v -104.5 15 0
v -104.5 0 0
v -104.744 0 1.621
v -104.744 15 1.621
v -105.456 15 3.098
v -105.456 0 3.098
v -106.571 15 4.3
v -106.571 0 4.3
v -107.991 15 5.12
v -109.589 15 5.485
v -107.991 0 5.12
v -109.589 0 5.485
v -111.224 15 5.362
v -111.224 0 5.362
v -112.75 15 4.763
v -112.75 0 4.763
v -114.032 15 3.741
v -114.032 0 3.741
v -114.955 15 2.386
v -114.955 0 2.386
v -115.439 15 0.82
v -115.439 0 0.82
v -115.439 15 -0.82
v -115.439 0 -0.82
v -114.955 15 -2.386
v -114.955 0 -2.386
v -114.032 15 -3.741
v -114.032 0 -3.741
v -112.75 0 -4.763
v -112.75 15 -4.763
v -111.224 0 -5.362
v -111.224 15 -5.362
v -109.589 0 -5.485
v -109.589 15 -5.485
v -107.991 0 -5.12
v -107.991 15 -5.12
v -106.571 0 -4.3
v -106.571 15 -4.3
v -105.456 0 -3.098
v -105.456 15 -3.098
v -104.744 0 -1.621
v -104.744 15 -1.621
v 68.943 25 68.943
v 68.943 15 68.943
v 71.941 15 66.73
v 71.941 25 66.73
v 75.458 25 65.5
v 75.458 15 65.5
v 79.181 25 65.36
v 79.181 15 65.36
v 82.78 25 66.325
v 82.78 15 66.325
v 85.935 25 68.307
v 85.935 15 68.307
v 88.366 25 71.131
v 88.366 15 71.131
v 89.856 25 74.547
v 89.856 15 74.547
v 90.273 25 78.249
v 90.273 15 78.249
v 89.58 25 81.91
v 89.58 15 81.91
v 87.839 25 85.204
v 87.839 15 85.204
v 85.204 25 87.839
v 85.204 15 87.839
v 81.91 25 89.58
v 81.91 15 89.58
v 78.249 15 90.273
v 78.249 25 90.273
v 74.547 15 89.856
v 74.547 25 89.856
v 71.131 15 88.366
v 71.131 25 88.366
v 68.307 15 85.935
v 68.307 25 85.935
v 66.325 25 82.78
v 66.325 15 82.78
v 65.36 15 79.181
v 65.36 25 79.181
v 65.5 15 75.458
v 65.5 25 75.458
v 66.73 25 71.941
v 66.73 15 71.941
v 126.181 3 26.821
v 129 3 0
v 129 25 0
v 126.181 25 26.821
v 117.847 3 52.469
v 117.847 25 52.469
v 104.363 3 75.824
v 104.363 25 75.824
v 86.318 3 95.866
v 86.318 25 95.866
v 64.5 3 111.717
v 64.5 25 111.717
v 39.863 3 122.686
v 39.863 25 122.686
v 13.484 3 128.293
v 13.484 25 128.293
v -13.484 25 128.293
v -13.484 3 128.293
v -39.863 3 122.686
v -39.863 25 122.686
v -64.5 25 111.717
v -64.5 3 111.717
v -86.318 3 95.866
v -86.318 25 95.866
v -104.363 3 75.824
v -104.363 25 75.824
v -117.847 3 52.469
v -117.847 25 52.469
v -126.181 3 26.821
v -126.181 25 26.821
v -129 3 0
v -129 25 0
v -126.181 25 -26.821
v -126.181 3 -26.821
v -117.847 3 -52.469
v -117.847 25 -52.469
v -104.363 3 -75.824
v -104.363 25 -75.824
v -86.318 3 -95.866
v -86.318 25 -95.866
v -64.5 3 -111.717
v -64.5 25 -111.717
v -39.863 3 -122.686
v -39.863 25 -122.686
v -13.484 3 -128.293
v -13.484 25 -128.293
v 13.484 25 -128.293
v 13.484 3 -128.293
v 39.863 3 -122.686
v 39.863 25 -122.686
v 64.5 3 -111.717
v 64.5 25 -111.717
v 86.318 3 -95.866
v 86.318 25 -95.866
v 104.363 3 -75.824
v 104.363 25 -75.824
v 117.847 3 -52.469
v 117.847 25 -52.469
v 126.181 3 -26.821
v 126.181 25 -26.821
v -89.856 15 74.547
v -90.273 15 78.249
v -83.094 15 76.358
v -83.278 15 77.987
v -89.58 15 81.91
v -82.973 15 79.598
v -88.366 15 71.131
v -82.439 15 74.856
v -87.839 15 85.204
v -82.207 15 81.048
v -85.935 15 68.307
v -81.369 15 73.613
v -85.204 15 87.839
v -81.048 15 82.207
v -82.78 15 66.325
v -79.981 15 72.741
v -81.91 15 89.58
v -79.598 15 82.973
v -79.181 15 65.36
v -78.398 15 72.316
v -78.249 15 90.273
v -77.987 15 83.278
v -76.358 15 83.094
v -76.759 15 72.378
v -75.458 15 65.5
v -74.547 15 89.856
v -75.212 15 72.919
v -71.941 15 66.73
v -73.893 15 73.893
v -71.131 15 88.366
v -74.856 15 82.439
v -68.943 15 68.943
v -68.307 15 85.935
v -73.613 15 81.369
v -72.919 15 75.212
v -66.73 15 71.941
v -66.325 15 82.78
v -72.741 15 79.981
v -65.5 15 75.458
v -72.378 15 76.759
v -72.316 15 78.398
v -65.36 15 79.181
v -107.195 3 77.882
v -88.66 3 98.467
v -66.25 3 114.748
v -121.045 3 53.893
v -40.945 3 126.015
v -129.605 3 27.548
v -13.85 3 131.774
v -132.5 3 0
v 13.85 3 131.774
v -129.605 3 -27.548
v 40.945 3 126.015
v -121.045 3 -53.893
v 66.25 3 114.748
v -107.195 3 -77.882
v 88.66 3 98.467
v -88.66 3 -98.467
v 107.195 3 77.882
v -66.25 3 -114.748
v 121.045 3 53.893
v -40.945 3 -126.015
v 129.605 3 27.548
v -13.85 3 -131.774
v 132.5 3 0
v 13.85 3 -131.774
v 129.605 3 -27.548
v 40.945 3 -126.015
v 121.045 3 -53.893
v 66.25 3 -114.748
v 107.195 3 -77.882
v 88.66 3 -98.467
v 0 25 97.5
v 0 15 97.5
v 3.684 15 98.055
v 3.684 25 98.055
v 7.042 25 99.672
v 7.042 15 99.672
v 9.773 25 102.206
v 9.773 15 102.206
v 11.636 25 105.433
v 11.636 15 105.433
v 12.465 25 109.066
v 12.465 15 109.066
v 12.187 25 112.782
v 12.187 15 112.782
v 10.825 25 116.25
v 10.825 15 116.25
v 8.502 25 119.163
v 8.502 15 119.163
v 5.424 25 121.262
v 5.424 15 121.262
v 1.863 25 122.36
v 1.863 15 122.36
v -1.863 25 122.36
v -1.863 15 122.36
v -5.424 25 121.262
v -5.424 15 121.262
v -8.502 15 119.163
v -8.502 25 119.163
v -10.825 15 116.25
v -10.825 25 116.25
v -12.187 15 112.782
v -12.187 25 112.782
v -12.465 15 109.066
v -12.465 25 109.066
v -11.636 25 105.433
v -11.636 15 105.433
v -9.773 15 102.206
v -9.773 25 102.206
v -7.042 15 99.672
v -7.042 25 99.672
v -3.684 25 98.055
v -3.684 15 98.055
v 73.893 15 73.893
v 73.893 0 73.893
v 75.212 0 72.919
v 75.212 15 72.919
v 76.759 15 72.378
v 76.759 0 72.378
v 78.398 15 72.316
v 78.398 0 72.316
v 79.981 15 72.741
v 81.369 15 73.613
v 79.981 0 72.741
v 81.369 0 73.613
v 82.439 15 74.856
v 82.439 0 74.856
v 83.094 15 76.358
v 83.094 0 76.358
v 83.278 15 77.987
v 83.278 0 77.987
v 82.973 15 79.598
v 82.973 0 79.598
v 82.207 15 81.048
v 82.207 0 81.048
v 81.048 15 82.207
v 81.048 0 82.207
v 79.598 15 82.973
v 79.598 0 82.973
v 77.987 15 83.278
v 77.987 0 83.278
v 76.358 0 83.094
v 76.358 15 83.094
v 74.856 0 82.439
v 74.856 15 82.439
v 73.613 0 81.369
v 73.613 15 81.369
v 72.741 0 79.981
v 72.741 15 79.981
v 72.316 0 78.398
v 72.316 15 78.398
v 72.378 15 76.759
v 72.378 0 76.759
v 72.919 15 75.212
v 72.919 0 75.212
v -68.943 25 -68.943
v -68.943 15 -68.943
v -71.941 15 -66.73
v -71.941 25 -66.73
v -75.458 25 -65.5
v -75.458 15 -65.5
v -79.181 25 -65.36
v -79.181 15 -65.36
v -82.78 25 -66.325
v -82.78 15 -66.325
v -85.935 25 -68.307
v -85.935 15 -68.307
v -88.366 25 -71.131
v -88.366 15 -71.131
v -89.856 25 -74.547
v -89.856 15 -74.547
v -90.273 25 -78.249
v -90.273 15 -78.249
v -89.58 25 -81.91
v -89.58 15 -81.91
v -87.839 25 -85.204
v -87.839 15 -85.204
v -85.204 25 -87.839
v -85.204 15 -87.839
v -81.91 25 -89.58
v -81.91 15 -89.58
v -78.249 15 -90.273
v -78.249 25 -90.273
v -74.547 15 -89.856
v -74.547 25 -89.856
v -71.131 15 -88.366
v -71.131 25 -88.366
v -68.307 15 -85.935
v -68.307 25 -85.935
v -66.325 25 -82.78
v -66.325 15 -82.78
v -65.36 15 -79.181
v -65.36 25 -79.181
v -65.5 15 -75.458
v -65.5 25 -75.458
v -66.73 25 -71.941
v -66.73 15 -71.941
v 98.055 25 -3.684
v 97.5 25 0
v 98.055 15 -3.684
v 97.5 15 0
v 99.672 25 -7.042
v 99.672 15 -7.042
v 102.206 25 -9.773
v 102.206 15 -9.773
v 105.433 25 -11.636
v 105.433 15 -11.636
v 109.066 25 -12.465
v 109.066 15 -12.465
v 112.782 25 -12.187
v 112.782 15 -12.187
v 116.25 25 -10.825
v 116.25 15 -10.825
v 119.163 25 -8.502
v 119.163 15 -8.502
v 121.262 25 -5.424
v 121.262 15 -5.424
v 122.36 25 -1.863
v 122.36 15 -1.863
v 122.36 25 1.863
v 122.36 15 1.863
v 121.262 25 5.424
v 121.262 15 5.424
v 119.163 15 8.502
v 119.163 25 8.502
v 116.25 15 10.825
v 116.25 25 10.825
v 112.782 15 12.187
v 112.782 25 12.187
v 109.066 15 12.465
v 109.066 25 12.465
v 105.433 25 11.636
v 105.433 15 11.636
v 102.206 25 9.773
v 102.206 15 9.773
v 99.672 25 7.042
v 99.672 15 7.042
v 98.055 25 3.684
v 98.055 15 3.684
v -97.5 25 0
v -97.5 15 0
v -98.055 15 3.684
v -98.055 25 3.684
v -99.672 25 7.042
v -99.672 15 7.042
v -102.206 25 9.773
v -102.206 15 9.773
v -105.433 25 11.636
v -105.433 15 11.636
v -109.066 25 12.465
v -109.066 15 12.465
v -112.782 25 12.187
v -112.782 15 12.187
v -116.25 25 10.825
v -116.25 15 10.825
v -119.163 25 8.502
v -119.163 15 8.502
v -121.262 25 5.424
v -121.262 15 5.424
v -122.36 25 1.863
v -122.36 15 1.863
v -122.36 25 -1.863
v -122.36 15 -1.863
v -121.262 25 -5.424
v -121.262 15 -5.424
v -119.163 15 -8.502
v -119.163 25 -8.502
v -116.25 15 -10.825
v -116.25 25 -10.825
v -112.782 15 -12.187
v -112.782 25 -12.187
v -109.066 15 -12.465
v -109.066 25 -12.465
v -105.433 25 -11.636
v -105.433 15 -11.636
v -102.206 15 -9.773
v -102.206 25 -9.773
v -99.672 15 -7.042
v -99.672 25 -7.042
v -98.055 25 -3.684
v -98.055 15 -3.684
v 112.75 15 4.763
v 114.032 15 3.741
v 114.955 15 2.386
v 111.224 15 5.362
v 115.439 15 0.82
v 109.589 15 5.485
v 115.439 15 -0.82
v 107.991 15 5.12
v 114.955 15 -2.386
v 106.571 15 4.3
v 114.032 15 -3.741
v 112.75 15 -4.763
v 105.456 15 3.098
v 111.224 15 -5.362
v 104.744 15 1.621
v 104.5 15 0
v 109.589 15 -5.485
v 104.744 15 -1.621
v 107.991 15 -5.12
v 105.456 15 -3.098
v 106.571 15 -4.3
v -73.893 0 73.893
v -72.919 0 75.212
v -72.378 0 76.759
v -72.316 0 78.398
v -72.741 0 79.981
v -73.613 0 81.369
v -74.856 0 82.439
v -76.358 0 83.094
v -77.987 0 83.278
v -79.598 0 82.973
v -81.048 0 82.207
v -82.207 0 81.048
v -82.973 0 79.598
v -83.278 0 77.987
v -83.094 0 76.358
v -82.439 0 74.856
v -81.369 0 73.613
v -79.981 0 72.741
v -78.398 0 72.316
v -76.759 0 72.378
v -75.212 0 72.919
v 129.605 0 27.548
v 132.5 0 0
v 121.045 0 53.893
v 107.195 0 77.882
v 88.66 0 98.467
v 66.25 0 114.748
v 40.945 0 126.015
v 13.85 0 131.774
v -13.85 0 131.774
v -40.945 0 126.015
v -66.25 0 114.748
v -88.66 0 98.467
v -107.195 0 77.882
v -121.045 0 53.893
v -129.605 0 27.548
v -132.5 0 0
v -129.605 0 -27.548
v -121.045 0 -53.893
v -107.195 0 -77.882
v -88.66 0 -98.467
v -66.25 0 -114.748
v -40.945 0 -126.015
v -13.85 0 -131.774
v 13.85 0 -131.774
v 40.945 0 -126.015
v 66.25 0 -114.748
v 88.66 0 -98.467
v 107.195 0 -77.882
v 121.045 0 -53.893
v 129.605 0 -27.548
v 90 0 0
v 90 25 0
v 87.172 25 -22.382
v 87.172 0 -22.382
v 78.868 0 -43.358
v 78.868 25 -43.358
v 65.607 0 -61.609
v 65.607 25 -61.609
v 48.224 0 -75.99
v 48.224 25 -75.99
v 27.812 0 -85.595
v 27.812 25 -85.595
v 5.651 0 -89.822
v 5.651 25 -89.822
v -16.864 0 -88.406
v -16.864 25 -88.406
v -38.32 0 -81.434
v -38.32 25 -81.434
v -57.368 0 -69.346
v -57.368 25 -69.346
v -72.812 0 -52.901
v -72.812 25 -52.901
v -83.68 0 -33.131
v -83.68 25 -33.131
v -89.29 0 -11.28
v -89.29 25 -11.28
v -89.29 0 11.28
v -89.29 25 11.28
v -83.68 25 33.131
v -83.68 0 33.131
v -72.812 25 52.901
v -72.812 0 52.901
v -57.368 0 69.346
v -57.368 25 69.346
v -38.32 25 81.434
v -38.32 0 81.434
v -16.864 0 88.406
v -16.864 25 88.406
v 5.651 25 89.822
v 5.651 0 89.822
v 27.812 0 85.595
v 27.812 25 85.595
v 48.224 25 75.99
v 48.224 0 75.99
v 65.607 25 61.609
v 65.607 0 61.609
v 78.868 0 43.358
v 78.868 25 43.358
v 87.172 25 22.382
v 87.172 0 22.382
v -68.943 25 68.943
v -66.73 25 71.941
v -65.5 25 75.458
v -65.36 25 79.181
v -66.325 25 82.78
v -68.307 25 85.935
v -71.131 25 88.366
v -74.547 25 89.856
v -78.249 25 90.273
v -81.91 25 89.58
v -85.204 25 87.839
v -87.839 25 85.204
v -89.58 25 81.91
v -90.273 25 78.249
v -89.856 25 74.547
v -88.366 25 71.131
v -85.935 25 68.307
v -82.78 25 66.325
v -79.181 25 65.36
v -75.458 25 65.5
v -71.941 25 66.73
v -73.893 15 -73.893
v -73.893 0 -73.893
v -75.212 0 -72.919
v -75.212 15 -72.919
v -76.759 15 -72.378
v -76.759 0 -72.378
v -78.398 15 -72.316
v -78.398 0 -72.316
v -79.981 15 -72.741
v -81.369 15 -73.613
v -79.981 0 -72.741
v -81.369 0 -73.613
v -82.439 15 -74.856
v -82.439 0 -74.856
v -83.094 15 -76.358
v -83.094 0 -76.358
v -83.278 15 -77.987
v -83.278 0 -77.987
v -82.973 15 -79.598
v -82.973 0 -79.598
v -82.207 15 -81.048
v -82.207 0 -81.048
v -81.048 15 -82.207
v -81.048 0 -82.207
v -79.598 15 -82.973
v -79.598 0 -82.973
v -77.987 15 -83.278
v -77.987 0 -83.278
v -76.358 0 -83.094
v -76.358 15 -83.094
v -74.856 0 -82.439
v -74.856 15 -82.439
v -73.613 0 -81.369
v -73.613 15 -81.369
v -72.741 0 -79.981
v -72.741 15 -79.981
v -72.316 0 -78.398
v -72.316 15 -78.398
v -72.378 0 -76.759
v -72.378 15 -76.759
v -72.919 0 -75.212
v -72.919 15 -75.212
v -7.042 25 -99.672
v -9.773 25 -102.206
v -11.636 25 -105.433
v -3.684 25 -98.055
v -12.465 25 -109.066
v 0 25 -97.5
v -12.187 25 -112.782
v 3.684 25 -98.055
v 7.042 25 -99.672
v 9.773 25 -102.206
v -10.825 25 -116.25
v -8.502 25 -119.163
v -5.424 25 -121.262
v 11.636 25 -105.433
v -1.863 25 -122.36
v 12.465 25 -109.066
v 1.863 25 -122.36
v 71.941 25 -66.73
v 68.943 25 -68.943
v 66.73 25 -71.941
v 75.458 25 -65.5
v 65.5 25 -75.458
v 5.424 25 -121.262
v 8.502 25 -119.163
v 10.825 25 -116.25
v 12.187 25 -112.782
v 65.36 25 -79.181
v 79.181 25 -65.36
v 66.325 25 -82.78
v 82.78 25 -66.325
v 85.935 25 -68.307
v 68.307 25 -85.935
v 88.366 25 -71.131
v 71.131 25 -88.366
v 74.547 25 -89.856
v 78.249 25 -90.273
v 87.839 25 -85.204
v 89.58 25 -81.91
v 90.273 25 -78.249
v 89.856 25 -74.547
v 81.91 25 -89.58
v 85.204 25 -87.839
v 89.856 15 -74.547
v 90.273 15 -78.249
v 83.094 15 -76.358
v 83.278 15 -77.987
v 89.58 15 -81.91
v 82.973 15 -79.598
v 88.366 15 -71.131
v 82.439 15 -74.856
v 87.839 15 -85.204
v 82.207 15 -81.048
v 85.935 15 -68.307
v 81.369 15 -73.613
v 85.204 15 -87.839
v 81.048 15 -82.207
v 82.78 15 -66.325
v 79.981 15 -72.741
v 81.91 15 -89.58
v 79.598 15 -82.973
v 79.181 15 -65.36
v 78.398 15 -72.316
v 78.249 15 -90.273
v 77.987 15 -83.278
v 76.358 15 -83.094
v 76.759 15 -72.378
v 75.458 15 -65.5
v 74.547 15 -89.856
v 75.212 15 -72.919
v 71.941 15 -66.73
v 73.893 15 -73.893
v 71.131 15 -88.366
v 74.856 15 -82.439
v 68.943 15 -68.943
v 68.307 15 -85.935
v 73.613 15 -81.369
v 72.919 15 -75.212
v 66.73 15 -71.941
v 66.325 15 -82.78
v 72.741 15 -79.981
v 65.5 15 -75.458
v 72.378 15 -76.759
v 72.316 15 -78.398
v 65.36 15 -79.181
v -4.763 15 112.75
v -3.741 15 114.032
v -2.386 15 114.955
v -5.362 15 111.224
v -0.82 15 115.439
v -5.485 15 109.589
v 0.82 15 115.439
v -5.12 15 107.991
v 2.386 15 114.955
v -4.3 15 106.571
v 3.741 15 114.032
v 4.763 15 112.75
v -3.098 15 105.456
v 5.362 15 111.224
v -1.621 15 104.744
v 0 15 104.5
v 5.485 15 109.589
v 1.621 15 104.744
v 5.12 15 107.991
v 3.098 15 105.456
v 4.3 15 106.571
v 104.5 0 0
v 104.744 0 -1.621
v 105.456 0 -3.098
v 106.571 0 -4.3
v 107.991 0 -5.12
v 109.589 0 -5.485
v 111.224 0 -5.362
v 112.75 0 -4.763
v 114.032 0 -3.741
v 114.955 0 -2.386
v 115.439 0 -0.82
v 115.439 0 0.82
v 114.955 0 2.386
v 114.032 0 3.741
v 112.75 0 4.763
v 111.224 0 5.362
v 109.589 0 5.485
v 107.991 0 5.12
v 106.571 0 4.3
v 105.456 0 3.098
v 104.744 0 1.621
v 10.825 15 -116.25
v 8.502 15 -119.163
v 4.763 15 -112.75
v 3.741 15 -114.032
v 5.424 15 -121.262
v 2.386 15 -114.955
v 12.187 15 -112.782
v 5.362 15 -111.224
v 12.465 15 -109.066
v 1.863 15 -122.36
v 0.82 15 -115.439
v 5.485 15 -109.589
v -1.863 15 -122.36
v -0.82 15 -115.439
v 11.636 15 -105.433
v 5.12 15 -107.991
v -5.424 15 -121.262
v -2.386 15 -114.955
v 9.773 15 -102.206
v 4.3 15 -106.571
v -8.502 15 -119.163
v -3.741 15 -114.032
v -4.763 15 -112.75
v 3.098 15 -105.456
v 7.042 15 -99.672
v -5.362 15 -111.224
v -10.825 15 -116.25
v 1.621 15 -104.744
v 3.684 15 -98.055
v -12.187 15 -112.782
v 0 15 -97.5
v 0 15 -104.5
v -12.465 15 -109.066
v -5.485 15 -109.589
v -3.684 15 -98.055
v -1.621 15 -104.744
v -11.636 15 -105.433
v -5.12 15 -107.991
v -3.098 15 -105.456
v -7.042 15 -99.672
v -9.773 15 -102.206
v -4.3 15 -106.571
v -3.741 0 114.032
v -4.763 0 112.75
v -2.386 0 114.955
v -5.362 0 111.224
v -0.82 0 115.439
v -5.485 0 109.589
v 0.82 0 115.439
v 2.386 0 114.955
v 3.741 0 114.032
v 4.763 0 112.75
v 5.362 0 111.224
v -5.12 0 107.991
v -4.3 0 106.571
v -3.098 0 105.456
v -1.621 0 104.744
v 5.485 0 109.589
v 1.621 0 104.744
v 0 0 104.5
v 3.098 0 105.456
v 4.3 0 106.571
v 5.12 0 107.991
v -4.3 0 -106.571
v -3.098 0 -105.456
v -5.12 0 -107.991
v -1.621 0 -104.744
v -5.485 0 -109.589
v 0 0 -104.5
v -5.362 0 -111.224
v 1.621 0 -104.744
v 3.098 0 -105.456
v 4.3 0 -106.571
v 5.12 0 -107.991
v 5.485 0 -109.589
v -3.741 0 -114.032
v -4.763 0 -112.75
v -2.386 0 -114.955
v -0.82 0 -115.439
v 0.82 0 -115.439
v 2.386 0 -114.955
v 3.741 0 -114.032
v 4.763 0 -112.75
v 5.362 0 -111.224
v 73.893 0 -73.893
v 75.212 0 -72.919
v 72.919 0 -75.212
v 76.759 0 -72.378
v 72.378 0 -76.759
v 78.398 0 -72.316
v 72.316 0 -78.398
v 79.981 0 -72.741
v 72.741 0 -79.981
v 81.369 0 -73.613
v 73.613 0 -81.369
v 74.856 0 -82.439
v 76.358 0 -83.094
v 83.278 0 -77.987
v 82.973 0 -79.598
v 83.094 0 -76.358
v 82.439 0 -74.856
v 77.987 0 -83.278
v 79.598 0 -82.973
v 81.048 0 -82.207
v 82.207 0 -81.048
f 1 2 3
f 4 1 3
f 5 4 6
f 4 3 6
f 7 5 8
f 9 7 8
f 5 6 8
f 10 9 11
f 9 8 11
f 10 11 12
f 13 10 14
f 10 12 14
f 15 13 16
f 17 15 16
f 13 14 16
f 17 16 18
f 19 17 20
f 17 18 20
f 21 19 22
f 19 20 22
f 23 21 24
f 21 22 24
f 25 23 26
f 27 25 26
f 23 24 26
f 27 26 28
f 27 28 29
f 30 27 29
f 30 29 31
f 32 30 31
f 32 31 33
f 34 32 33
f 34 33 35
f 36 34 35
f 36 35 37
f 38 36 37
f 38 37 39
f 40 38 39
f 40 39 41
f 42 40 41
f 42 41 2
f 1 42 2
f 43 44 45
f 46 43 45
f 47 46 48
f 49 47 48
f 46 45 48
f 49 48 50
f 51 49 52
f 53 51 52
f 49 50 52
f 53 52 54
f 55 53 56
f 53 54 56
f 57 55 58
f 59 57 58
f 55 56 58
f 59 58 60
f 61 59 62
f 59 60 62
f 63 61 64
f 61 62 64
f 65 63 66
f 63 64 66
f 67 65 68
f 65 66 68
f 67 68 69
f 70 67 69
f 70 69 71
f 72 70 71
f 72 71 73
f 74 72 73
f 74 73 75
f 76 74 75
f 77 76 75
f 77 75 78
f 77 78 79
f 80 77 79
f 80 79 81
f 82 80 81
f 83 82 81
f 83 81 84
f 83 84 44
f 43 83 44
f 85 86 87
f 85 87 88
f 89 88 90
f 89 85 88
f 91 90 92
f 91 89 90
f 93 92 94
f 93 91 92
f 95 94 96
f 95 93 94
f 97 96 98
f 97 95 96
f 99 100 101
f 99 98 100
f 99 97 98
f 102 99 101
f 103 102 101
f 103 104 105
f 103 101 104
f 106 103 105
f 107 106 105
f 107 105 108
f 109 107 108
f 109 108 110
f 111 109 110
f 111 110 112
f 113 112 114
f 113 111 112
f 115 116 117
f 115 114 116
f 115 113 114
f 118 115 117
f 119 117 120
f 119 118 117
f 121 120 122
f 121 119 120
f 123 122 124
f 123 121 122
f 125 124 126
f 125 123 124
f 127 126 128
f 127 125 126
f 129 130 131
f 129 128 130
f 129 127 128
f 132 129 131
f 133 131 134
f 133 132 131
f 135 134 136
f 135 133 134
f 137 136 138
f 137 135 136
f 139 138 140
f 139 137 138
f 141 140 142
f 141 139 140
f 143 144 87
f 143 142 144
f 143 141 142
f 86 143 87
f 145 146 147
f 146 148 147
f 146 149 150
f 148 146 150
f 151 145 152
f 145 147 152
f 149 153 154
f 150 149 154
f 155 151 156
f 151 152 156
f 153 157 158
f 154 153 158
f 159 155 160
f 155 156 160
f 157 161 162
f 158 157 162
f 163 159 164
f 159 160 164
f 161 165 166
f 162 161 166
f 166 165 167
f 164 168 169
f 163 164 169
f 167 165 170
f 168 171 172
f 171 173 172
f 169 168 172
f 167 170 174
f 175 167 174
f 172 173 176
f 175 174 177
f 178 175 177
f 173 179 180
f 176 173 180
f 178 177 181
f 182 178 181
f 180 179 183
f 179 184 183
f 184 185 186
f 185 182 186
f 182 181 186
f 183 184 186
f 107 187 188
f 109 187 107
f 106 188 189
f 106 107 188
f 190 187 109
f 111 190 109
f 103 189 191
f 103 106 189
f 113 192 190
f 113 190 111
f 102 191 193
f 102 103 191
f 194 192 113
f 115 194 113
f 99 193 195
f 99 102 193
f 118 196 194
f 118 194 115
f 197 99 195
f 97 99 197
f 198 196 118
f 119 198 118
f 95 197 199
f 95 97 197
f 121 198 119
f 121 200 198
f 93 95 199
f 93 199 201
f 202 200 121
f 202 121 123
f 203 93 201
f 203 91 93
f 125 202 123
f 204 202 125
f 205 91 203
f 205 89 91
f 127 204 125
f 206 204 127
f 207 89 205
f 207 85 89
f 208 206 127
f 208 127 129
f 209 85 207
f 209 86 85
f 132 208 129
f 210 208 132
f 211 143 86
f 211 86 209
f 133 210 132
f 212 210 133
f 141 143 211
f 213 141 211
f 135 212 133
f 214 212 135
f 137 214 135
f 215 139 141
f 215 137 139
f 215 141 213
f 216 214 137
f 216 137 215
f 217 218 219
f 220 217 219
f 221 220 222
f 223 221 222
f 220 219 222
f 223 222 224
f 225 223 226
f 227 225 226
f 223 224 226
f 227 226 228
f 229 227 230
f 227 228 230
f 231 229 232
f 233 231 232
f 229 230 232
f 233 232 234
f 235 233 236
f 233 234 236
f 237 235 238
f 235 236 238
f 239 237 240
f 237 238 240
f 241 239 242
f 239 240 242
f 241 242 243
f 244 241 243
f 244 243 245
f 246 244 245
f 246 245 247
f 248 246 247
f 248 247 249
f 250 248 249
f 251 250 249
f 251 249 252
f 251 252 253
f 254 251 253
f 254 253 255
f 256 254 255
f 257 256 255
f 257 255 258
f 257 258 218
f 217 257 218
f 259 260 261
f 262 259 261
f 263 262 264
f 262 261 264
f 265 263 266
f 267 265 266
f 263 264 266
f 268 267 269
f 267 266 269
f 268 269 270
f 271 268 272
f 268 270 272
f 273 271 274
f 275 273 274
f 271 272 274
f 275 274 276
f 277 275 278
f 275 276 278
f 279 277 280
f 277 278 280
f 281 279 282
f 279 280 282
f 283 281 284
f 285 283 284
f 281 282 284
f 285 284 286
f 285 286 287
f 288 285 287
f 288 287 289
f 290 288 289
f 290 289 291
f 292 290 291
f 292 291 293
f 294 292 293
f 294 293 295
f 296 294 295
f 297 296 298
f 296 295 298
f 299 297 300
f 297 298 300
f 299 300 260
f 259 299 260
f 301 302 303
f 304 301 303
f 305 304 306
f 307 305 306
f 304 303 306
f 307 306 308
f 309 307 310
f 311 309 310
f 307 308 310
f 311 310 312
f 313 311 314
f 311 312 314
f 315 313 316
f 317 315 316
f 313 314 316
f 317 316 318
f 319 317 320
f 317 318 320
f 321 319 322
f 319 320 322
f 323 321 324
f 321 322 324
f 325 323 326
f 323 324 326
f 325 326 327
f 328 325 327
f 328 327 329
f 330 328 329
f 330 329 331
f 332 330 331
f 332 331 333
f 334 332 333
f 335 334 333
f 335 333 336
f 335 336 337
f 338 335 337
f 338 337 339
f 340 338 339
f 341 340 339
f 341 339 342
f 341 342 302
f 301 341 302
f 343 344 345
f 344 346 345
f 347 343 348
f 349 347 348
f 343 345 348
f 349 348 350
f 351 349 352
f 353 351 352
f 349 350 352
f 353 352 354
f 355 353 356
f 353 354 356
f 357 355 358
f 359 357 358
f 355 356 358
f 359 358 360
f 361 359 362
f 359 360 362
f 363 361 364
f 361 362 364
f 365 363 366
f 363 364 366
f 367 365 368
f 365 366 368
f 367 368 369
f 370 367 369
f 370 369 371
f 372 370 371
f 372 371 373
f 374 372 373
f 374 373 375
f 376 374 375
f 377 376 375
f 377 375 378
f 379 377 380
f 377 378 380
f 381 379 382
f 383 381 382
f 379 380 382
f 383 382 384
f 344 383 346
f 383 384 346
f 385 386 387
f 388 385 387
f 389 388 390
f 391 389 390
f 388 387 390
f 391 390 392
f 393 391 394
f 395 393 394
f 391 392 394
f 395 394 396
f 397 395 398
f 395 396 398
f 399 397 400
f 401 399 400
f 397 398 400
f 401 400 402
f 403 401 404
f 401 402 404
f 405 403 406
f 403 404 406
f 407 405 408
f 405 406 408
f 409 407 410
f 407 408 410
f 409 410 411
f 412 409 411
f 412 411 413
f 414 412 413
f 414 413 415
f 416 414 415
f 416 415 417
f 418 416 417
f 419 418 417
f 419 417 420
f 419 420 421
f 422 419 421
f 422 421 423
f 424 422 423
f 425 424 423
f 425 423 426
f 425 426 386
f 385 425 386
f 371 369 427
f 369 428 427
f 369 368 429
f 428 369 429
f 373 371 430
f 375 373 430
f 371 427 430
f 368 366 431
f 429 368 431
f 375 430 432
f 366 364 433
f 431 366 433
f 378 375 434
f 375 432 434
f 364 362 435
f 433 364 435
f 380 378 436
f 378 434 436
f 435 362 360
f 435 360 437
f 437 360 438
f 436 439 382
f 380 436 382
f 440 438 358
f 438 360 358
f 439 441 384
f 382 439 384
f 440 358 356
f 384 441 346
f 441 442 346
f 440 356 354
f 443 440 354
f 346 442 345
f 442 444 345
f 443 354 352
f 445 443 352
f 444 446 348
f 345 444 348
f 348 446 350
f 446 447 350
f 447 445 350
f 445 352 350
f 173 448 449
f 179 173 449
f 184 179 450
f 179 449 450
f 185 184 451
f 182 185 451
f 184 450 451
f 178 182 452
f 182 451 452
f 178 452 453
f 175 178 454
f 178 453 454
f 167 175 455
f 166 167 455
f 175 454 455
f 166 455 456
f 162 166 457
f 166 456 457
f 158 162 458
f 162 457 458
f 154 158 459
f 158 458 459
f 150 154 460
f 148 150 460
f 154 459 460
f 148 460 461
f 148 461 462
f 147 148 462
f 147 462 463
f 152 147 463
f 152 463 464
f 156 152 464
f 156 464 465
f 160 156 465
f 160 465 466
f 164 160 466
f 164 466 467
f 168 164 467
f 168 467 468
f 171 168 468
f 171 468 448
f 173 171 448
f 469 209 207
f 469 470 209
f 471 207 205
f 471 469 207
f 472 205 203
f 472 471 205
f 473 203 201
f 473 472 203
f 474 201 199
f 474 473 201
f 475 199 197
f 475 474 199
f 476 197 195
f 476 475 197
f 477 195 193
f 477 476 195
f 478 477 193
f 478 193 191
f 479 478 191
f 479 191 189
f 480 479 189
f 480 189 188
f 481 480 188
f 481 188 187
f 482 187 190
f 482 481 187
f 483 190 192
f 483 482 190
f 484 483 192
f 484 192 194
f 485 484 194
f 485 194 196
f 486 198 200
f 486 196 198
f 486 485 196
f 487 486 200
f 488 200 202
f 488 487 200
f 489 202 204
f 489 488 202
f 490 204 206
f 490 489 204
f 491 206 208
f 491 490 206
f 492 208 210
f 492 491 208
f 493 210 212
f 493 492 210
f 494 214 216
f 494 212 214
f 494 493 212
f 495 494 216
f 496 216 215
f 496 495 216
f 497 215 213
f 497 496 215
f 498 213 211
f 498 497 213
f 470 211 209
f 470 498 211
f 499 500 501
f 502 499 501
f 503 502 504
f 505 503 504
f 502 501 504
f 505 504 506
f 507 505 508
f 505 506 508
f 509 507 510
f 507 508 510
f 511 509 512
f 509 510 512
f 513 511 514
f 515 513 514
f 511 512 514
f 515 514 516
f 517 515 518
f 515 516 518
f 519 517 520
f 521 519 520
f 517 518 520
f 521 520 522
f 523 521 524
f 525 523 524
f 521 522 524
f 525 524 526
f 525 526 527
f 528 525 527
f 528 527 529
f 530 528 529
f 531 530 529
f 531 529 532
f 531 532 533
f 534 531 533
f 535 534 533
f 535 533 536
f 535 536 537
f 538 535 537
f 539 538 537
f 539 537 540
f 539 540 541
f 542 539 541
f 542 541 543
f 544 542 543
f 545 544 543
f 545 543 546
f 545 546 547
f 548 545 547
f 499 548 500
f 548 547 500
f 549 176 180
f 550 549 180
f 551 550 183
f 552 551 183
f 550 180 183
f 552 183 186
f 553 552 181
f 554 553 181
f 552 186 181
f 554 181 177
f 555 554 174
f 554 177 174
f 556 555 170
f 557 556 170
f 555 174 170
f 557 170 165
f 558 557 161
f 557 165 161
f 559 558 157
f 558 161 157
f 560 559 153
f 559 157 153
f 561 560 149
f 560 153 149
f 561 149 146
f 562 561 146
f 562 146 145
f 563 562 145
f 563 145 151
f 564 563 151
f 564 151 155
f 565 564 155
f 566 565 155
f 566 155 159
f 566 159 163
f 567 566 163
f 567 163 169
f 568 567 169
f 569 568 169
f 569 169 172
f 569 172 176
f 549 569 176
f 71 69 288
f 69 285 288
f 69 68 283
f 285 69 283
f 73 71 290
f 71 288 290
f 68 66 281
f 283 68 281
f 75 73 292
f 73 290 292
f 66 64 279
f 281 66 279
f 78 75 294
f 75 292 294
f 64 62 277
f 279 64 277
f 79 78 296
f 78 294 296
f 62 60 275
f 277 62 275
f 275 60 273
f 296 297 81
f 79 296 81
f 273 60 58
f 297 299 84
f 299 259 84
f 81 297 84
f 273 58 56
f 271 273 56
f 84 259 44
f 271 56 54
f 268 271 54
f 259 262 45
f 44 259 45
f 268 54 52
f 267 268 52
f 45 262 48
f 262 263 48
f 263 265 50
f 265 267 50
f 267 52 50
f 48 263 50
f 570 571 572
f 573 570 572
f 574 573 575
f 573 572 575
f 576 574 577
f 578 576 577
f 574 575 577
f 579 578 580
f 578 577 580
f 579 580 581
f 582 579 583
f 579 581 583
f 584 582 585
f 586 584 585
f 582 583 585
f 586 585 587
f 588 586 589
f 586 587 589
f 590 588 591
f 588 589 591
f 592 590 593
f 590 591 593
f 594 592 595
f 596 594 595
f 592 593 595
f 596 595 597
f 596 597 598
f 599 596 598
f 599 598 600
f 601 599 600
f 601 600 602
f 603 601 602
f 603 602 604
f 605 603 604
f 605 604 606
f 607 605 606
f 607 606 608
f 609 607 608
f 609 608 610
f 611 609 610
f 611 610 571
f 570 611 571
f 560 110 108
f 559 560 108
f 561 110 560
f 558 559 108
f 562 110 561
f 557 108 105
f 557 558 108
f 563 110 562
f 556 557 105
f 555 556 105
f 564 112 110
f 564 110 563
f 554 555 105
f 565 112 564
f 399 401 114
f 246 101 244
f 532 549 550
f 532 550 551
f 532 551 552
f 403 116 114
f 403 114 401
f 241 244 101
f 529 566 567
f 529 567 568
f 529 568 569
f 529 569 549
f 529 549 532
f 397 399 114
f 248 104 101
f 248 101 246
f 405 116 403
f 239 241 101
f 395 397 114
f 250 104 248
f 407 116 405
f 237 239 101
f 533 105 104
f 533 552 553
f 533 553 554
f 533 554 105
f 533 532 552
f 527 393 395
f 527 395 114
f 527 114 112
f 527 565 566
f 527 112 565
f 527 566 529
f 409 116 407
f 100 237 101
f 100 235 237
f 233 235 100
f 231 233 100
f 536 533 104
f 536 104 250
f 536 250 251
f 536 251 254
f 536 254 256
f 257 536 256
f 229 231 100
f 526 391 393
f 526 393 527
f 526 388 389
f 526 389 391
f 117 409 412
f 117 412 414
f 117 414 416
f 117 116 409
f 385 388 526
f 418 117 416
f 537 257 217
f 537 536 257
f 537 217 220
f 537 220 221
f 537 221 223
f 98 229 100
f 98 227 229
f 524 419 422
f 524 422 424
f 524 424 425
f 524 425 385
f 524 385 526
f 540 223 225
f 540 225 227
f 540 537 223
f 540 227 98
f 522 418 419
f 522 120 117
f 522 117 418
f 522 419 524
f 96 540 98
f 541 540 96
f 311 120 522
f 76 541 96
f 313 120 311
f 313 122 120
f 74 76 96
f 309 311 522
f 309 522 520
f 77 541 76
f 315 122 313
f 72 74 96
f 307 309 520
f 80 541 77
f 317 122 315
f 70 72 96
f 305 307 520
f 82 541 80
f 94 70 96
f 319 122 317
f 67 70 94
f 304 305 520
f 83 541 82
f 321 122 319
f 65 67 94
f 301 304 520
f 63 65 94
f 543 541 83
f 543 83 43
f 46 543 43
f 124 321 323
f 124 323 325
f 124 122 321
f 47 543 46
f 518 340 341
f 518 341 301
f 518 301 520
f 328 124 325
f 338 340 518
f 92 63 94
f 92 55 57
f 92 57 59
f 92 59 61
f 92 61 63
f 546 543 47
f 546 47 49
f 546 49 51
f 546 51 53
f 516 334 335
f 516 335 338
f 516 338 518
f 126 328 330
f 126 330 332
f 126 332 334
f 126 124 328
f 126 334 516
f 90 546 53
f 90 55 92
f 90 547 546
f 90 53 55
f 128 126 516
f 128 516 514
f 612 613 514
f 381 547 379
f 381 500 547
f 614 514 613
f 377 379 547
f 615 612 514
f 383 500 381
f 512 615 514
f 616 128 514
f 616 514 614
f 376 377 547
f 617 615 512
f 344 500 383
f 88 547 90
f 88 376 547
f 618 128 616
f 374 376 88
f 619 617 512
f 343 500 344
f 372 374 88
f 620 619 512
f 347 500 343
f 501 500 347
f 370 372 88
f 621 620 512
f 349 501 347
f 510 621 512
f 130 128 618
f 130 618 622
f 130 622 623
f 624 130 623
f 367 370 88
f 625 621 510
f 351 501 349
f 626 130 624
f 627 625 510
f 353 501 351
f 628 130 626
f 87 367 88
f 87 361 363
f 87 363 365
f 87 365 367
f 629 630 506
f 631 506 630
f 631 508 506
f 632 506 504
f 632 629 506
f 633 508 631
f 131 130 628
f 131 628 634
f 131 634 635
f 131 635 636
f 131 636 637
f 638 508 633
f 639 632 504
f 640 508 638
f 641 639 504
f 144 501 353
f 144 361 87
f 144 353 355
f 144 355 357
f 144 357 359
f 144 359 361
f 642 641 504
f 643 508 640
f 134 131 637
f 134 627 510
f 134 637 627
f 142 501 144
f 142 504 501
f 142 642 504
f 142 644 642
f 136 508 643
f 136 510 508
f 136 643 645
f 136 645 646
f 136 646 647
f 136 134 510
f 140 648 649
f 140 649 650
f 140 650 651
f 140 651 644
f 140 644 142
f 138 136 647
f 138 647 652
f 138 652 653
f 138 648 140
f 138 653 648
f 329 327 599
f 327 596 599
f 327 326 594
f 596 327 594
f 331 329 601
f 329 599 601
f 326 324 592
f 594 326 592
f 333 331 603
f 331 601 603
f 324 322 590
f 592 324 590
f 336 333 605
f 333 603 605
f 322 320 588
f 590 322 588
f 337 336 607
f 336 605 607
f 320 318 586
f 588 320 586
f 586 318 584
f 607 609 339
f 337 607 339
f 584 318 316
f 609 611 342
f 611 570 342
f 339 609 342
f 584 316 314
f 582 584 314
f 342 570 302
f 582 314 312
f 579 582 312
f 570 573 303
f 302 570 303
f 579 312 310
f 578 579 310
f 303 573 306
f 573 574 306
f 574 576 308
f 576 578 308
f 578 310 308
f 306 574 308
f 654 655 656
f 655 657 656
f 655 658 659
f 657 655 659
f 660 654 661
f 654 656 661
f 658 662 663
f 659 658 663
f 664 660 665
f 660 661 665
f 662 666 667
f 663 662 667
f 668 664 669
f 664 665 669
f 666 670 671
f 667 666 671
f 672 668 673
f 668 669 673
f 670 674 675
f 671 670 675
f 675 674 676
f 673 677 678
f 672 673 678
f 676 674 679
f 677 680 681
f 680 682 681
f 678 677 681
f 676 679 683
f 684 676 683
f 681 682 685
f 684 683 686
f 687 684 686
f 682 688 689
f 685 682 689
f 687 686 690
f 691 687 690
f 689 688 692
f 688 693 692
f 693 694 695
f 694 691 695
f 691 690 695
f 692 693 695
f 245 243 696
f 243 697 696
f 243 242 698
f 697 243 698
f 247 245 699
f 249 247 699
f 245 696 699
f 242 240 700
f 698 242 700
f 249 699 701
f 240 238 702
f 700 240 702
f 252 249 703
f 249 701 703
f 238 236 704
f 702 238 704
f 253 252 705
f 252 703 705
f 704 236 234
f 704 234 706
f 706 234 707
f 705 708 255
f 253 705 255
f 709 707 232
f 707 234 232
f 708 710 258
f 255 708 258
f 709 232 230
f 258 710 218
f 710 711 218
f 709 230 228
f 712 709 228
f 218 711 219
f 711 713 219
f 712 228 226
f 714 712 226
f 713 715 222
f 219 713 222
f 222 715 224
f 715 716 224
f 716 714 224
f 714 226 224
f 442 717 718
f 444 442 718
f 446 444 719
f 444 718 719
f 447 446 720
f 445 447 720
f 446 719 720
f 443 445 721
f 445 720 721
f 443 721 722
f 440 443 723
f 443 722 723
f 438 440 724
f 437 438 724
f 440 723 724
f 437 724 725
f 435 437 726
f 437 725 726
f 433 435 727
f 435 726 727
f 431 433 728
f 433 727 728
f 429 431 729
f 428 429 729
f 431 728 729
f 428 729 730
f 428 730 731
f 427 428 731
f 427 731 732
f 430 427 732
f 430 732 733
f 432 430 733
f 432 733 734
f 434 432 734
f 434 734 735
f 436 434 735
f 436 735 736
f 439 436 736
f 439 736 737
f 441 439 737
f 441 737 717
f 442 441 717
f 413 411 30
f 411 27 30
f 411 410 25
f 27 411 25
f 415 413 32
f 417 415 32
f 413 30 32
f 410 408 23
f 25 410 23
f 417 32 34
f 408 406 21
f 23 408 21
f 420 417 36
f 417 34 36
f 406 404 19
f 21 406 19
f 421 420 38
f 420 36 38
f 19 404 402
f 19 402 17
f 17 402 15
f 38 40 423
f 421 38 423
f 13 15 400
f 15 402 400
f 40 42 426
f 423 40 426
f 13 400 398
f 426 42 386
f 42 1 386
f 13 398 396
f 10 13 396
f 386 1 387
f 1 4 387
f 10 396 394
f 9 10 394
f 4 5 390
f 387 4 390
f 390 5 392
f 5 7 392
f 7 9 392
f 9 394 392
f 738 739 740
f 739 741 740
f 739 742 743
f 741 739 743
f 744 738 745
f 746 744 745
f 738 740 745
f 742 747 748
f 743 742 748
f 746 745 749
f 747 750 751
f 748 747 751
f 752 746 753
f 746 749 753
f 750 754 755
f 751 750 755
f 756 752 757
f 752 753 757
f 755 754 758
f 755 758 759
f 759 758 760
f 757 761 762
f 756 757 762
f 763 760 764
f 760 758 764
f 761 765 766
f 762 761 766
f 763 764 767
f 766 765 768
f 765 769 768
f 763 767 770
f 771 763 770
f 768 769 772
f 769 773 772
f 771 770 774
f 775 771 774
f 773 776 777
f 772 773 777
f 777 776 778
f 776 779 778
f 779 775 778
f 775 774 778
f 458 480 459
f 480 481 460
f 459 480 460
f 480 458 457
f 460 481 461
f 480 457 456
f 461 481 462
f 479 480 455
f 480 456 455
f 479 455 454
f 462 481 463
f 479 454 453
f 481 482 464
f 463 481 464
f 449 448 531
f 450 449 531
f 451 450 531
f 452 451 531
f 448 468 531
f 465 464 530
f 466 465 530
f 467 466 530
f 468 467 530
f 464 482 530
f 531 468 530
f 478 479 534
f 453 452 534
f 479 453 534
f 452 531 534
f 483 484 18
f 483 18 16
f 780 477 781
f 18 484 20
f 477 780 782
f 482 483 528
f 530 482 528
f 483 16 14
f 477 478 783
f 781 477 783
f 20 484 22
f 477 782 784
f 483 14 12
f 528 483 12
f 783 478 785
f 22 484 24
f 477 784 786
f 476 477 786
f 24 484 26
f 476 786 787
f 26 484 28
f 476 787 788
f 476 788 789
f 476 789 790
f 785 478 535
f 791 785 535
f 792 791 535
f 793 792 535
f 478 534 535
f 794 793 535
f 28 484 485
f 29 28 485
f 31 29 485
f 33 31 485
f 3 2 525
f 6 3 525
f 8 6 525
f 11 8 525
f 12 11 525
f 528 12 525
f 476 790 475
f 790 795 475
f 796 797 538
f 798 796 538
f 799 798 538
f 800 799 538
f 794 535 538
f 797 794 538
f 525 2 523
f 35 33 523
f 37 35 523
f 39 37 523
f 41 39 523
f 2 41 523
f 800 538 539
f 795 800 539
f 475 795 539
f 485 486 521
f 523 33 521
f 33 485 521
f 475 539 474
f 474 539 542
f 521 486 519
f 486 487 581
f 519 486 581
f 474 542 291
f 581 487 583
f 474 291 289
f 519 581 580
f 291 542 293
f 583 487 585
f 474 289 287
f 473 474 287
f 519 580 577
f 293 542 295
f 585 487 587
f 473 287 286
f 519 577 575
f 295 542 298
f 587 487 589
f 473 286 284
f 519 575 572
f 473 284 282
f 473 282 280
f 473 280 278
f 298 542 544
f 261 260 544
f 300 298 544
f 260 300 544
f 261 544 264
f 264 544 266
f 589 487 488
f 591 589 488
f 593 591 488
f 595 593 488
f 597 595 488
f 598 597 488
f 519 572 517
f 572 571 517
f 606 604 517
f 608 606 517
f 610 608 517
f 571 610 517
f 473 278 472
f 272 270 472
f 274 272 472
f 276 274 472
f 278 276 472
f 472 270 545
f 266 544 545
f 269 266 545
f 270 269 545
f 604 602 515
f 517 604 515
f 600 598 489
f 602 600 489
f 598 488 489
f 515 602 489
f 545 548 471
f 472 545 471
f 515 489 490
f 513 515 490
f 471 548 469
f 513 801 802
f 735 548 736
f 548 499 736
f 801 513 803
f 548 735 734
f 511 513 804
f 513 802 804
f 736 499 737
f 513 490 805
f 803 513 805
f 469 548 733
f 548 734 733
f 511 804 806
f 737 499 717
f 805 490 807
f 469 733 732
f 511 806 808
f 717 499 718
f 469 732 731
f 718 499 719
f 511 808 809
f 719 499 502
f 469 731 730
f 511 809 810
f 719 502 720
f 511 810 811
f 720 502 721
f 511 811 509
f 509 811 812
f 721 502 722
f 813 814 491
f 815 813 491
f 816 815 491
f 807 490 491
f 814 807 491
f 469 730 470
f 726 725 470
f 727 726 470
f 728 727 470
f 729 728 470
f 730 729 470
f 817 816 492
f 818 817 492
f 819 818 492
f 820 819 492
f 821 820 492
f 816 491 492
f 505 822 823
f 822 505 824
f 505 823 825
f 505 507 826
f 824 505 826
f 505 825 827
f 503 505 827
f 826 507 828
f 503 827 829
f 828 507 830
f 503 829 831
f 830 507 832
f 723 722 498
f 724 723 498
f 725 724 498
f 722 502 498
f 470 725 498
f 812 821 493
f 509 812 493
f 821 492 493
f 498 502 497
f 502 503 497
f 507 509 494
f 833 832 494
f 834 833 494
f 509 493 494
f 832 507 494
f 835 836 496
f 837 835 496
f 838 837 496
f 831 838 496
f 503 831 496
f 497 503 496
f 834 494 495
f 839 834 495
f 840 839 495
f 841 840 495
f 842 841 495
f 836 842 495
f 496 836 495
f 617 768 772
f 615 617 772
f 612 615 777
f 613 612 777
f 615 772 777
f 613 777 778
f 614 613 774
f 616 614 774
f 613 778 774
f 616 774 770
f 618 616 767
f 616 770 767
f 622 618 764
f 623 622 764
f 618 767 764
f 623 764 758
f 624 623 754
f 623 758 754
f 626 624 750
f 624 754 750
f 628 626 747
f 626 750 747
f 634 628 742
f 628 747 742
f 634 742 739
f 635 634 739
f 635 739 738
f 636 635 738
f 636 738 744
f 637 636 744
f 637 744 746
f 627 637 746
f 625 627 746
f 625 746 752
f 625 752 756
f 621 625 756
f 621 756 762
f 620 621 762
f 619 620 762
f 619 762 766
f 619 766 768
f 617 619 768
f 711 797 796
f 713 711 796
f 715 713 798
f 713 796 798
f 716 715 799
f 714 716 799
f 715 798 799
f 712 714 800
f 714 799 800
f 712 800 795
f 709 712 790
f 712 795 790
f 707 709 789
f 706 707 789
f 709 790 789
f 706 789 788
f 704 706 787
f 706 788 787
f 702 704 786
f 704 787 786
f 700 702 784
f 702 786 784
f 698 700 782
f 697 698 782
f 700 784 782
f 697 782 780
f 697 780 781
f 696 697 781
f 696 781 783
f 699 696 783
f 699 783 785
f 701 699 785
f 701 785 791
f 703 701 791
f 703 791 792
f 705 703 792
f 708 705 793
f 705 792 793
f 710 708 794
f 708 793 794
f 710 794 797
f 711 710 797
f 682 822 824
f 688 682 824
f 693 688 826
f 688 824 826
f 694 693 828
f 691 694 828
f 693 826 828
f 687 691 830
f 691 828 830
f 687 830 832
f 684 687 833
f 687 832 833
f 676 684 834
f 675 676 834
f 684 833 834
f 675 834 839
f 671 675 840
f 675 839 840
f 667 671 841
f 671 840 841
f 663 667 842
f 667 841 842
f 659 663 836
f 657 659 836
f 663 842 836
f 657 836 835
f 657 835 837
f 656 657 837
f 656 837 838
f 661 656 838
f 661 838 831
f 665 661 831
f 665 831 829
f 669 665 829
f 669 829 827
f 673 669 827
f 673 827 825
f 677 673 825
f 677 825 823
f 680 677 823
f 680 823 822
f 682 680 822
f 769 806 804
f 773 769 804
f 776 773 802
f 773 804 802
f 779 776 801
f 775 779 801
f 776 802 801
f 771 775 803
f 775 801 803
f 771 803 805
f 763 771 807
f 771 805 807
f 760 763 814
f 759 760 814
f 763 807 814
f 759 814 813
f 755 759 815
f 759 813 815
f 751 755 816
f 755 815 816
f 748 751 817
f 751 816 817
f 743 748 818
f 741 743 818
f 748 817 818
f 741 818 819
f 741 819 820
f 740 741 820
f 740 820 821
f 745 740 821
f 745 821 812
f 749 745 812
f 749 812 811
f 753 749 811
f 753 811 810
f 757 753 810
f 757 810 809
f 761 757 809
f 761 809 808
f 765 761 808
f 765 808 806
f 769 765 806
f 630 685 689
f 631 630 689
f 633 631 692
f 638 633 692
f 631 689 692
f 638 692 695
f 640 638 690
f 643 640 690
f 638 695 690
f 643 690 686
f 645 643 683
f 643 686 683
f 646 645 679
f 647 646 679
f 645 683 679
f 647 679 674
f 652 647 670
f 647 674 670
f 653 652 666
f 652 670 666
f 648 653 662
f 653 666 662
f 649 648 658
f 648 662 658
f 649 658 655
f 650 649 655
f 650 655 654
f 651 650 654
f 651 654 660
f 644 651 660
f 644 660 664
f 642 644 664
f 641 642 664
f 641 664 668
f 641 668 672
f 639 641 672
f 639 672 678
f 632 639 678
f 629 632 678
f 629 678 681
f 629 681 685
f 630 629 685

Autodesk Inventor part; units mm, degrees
ref_plane "YZ Plane" through (0, 0, 0) normal (1, 0, 0) x (0, 1, 0)
ref_plane "XZ Plane" through (0, 0, 0) normal (0, 1, 0) x (-1, 0, 0)
ref_plane "XY Plane" through (0, 0, 0) normal (0, 0, 1) x (1, 0, 0)
sketch "Sketch6" plane through (0, 0, 0) normal (0, 0, 1) x (1, 0, 0)
  line L0 (90, 0) -> (90, 25)
  line L1 (90, 25) -> (129, 25)
  line L2 (129, 25) -> (129, 3)
  line L3 (129, 3) -> (132.5, 3)
  line L4 (132.5, 3) -> (132.5, 0)
  line L5 (132.5, 0) -> (90, 0)
  line L6 (0, 0) -> (0, 25)
  point P0 (0, 0)
  dimension "d27" = 180
  dimension "d28" = 258
  dimension "d29" = 265
  dimension "d30" = 3
  dimension "d31" = 25
revolve "Revolution1" add sketch "Sketch6" angle 360 about axis through (0, 0, 0) along (0, 1, 0)
sketch "Sketch7" plane through (0, 25, 0) normal (0, 1, 0) x (1, 0, 0)
  circle A0 centre (0, 0) radius 110
  point P0 (0, 110)
  dimension "d33" = 220
hole "Hole2" at (0, 25, -110) direction (0, -1, 0) diameter 11 end through all counterbore diameter 25 counterbore depth 10
pattern_circular "Circular Pattern3" count 8 over 360 about axis through (0, -10, 0) along (0, 1, 0) of "Hole2"
equation "\"d39\" = Thickness"
equation "\"Thickness\" = 40"
properties part number "DMF 01 31 Барабан Опорное кольцо НОС v2.1"
